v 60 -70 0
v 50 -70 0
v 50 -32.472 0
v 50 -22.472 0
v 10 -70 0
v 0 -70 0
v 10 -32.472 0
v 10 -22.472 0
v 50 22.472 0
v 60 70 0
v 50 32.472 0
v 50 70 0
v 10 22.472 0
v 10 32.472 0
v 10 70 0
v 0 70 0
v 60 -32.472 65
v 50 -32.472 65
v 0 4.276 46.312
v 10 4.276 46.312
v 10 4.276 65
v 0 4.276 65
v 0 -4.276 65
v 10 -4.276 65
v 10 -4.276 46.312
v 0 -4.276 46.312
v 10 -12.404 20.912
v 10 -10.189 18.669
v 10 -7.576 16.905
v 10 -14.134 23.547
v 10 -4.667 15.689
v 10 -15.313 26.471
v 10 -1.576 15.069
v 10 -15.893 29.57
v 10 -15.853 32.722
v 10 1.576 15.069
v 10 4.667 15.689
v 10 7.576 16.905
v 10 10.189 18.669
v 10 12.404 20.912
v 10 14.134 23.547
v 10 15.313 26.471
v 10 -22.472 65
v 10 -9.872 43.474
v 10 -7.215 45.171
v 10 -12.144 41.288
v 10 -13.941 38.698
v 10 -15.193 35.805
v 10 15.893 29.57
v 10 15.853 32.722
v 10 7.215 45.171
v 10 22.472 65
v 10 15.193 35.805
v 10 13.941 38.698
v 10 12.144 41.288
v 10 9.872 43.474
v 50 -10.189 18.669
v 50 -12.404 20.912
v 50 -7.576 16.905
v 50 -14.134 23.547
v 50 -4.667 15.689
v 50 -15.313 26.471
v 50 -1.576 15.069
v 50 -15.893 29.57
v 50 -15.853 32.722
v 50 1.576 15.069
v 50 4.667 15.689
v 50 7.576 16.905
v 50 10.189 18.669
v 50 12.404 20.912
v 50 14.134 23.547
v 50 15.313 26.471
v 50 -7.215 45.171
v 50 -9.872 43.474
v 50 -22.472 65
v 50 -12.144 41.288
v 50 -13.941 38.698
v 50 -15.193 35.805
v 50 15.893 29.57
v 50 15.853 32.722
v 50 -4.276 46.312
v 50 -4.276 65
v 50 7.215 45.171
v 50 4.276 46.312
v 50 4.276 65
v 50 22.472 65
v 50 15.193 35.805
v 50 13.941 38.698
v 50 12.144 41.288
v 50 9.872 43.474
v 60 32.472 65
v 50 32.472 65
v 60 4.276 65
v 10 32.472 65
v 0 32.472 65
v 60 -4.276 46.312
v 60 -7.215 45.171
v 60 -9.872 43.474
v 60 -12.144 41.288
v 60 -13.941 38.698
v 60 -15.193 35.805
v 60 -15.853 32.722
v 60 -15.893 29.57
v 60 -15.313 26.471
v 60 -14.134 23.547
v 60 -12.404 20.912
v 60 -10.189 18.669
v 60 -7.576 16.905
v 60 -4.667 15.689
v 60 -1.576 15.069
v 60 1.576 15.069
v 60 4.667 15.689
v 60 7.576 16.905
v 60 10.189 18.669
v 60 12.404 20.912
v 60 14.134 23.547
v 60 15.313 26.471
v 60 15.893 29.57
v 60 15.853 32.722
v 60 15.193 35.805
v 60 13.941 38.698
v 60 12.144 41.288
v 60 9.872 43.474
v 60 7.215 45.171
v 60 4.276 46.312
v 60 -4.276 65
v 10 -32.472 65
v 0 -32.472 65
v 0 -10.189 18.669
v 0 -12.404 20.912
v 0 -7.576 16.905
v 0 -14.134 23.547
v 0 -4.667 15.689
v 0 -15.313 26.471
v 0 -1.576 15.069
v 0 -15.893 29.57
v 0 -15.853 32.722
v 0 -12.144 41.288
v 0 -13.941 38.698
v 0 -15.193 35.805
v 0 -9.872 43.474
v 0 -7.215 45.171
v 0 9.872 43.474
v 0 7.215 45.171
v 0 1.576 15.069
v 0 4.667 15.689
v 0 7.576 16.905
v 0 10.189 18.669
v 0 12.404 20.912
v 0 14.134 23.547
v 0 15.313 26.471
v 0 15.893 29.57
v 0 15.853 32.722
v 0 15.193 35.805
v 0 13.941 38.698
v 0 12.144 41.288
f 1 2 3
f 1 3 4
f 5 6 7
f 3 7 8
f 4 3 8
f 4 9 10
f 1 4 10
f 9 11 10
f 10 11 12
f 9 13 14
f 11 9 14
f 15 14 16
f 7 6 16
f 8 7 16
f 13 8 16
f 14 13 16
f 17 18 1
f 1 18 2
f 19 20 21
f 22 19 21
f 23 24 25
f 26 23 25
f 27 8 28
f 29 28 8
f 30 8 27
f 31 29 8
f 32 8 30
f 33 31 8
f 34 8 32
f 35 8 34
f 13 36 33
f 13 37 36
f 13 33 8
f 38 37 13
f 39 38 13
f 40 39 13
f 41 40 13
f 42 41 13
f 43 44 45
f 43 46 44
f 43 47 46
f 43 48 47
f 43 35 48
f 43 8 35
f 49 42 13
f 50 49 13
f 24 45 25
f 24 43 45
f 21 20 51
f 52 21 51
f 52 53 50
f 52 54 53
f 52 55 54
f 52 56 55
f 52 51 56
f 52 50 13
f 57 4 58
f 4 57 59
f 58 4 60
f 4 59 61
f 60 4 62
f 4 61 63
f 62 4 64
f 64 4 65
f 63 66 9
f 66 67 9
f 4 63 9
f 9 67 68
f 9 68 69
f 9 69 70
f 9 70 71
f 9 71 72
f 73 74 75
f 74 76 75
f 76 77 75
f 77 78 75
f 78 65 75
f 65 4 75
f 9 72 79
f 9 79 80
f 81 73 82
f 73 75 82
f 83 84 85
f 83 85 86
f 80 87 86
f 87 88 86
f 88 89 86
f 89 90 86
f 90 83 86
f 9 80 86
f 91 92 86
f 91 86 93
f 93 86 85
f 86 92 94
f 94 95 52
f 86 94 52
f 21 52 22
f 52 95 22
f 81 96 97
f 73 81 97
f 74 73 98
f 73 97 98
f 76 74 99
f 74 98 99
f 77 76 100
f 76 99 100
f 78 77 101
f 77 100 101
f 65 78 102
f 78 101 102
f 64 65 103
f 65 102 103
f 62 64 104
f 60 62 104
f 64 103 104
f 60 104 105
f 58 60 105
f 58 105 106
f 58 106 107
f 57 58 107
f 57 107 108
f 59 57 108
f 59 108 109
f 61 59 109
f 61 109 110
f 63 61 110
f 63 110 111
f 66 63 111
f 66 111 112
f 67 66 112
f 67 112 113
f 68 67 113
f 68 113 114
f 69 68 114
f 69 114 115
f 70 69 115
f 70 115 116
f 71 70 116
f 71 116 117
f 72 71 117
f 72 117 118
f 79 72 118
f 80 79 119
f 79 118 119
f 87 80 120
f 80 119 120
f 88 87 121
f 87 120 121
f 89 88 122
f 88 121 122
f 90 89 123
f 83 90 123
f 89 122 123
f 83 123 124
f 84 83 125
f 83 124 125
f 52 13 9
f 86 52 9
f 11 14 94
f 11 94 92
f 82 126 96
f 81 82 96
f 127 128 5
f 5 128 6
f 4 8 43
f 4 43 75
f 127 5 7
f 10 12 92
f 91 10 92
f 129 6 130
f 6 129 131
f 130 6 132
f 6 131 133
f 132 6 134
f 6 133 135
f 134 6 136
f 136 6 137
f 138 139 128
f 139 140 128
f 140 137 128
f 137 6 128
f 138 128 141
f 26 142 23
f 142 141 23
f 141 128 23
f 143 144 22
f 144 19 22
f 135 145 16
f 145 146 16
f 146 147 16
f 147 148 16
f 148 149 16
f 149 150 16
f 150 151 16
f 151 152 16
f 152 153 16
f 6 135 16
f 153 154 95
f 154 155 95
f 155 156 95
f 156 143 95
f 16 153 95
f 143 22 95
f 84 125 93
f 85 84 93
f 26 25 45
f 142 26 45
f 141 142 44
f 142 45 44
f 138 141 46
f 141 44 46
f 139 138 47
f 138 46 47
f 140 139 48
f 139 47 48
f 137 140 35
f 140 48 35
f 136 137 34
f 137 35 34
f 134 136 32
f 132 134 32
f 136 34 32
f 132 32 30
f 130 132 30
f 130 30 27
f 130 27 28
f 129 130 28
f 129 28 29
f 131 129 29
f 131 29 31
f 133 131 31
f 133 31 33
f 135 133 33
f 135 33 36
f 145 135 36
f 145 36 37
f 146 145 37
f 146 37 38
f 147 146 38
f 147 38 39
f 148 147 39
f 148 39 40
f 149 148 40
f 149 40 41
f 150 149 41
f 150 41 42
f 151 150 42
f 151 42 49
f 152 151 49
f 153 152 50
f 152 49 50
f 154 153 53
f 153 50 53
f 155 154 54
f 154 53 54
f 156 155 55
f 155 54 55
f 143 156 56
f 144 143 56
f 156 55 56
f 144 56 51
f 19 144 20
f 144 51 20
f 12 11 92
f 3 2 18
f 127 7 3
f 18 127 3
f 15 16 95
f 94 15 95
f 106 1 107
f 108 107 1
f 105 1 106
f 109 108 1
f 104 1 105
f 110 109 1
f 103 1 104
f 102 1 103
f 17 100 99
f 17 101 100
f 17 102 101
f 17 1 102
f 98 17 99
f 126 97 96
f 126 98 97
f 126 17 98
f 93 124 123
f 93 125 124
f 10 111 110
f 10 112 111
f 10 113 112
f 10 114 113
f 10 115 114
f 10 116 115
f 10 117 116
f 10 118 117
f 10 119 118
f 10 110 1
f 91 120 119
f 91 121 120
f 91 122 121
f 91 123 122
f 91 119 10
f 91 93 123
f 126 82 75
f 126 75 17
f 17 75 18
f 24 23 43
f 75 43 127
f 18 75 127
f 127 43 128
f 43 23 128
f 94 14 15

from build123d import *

# Parameters (mm, degrees)
F1_DEPTH = 60
F2_W     = 40
F2_H     = 51.5072302302
F3_DEPTH = 126
F4_W     = 40
F4_H     = 44.9444650053
F5_DEPTH = 92
F7_DEPTH = 76


with BuildPart() as f1:
    # F0 (on Right) → F1 (new body)
    with BuildSketch(Plane.YZ):
        Polygon((-70, 0), (0, 0), (70, 0), (32.4722325027, 65), (0, 65), (-32.4722325027, 65), align=None)
    extrude(amount=F1_DEPTH)

    # F2 (on face) → F3 (cut)
    with BuildSketch(Plane.XY.offset(65)):
        with Locations((30, -58.2258476178)):
            Rectangle(F2_W, F2_H)
        with Locations((30, 58.2258476178)):
            Rectangle(F2_W, F2_H)
    extrude(amount=-F3_DEPTH, mode=Mode.SUBTRACT)

    # F4 (on face) → F5 (cut)
    with BuildSketch(Plane.XY.offset(65)):
        with Locations((30, 0)):
            Rectangle(F4_W, F4_H)
    extrude(amount=-F5_DEPTH, mode=Mode.SUBTRACT)

    # F6 (on face) → F7 (cut)
    with BuildSketch(Plane.YZ.offset(60)):
        with BuildLine():
            Line((-4.2762281873, 65), (-4.2762281873, 46.3116985224))
            ThreePointArc((-4.2762281873, 46.3116985224), (0, 14.9908759852), (4.2762281873, 46.3116985224))
            Line((4.2762281873, 46.3116985224), (4.2762281873, 65))
            Line((4.2762281873, 65), (-4.2762281873, 65))
        make_face()
    extrude(amount=-F7_DEPTH, mode=Mode.SUBTRACT)


solid = f1.part
